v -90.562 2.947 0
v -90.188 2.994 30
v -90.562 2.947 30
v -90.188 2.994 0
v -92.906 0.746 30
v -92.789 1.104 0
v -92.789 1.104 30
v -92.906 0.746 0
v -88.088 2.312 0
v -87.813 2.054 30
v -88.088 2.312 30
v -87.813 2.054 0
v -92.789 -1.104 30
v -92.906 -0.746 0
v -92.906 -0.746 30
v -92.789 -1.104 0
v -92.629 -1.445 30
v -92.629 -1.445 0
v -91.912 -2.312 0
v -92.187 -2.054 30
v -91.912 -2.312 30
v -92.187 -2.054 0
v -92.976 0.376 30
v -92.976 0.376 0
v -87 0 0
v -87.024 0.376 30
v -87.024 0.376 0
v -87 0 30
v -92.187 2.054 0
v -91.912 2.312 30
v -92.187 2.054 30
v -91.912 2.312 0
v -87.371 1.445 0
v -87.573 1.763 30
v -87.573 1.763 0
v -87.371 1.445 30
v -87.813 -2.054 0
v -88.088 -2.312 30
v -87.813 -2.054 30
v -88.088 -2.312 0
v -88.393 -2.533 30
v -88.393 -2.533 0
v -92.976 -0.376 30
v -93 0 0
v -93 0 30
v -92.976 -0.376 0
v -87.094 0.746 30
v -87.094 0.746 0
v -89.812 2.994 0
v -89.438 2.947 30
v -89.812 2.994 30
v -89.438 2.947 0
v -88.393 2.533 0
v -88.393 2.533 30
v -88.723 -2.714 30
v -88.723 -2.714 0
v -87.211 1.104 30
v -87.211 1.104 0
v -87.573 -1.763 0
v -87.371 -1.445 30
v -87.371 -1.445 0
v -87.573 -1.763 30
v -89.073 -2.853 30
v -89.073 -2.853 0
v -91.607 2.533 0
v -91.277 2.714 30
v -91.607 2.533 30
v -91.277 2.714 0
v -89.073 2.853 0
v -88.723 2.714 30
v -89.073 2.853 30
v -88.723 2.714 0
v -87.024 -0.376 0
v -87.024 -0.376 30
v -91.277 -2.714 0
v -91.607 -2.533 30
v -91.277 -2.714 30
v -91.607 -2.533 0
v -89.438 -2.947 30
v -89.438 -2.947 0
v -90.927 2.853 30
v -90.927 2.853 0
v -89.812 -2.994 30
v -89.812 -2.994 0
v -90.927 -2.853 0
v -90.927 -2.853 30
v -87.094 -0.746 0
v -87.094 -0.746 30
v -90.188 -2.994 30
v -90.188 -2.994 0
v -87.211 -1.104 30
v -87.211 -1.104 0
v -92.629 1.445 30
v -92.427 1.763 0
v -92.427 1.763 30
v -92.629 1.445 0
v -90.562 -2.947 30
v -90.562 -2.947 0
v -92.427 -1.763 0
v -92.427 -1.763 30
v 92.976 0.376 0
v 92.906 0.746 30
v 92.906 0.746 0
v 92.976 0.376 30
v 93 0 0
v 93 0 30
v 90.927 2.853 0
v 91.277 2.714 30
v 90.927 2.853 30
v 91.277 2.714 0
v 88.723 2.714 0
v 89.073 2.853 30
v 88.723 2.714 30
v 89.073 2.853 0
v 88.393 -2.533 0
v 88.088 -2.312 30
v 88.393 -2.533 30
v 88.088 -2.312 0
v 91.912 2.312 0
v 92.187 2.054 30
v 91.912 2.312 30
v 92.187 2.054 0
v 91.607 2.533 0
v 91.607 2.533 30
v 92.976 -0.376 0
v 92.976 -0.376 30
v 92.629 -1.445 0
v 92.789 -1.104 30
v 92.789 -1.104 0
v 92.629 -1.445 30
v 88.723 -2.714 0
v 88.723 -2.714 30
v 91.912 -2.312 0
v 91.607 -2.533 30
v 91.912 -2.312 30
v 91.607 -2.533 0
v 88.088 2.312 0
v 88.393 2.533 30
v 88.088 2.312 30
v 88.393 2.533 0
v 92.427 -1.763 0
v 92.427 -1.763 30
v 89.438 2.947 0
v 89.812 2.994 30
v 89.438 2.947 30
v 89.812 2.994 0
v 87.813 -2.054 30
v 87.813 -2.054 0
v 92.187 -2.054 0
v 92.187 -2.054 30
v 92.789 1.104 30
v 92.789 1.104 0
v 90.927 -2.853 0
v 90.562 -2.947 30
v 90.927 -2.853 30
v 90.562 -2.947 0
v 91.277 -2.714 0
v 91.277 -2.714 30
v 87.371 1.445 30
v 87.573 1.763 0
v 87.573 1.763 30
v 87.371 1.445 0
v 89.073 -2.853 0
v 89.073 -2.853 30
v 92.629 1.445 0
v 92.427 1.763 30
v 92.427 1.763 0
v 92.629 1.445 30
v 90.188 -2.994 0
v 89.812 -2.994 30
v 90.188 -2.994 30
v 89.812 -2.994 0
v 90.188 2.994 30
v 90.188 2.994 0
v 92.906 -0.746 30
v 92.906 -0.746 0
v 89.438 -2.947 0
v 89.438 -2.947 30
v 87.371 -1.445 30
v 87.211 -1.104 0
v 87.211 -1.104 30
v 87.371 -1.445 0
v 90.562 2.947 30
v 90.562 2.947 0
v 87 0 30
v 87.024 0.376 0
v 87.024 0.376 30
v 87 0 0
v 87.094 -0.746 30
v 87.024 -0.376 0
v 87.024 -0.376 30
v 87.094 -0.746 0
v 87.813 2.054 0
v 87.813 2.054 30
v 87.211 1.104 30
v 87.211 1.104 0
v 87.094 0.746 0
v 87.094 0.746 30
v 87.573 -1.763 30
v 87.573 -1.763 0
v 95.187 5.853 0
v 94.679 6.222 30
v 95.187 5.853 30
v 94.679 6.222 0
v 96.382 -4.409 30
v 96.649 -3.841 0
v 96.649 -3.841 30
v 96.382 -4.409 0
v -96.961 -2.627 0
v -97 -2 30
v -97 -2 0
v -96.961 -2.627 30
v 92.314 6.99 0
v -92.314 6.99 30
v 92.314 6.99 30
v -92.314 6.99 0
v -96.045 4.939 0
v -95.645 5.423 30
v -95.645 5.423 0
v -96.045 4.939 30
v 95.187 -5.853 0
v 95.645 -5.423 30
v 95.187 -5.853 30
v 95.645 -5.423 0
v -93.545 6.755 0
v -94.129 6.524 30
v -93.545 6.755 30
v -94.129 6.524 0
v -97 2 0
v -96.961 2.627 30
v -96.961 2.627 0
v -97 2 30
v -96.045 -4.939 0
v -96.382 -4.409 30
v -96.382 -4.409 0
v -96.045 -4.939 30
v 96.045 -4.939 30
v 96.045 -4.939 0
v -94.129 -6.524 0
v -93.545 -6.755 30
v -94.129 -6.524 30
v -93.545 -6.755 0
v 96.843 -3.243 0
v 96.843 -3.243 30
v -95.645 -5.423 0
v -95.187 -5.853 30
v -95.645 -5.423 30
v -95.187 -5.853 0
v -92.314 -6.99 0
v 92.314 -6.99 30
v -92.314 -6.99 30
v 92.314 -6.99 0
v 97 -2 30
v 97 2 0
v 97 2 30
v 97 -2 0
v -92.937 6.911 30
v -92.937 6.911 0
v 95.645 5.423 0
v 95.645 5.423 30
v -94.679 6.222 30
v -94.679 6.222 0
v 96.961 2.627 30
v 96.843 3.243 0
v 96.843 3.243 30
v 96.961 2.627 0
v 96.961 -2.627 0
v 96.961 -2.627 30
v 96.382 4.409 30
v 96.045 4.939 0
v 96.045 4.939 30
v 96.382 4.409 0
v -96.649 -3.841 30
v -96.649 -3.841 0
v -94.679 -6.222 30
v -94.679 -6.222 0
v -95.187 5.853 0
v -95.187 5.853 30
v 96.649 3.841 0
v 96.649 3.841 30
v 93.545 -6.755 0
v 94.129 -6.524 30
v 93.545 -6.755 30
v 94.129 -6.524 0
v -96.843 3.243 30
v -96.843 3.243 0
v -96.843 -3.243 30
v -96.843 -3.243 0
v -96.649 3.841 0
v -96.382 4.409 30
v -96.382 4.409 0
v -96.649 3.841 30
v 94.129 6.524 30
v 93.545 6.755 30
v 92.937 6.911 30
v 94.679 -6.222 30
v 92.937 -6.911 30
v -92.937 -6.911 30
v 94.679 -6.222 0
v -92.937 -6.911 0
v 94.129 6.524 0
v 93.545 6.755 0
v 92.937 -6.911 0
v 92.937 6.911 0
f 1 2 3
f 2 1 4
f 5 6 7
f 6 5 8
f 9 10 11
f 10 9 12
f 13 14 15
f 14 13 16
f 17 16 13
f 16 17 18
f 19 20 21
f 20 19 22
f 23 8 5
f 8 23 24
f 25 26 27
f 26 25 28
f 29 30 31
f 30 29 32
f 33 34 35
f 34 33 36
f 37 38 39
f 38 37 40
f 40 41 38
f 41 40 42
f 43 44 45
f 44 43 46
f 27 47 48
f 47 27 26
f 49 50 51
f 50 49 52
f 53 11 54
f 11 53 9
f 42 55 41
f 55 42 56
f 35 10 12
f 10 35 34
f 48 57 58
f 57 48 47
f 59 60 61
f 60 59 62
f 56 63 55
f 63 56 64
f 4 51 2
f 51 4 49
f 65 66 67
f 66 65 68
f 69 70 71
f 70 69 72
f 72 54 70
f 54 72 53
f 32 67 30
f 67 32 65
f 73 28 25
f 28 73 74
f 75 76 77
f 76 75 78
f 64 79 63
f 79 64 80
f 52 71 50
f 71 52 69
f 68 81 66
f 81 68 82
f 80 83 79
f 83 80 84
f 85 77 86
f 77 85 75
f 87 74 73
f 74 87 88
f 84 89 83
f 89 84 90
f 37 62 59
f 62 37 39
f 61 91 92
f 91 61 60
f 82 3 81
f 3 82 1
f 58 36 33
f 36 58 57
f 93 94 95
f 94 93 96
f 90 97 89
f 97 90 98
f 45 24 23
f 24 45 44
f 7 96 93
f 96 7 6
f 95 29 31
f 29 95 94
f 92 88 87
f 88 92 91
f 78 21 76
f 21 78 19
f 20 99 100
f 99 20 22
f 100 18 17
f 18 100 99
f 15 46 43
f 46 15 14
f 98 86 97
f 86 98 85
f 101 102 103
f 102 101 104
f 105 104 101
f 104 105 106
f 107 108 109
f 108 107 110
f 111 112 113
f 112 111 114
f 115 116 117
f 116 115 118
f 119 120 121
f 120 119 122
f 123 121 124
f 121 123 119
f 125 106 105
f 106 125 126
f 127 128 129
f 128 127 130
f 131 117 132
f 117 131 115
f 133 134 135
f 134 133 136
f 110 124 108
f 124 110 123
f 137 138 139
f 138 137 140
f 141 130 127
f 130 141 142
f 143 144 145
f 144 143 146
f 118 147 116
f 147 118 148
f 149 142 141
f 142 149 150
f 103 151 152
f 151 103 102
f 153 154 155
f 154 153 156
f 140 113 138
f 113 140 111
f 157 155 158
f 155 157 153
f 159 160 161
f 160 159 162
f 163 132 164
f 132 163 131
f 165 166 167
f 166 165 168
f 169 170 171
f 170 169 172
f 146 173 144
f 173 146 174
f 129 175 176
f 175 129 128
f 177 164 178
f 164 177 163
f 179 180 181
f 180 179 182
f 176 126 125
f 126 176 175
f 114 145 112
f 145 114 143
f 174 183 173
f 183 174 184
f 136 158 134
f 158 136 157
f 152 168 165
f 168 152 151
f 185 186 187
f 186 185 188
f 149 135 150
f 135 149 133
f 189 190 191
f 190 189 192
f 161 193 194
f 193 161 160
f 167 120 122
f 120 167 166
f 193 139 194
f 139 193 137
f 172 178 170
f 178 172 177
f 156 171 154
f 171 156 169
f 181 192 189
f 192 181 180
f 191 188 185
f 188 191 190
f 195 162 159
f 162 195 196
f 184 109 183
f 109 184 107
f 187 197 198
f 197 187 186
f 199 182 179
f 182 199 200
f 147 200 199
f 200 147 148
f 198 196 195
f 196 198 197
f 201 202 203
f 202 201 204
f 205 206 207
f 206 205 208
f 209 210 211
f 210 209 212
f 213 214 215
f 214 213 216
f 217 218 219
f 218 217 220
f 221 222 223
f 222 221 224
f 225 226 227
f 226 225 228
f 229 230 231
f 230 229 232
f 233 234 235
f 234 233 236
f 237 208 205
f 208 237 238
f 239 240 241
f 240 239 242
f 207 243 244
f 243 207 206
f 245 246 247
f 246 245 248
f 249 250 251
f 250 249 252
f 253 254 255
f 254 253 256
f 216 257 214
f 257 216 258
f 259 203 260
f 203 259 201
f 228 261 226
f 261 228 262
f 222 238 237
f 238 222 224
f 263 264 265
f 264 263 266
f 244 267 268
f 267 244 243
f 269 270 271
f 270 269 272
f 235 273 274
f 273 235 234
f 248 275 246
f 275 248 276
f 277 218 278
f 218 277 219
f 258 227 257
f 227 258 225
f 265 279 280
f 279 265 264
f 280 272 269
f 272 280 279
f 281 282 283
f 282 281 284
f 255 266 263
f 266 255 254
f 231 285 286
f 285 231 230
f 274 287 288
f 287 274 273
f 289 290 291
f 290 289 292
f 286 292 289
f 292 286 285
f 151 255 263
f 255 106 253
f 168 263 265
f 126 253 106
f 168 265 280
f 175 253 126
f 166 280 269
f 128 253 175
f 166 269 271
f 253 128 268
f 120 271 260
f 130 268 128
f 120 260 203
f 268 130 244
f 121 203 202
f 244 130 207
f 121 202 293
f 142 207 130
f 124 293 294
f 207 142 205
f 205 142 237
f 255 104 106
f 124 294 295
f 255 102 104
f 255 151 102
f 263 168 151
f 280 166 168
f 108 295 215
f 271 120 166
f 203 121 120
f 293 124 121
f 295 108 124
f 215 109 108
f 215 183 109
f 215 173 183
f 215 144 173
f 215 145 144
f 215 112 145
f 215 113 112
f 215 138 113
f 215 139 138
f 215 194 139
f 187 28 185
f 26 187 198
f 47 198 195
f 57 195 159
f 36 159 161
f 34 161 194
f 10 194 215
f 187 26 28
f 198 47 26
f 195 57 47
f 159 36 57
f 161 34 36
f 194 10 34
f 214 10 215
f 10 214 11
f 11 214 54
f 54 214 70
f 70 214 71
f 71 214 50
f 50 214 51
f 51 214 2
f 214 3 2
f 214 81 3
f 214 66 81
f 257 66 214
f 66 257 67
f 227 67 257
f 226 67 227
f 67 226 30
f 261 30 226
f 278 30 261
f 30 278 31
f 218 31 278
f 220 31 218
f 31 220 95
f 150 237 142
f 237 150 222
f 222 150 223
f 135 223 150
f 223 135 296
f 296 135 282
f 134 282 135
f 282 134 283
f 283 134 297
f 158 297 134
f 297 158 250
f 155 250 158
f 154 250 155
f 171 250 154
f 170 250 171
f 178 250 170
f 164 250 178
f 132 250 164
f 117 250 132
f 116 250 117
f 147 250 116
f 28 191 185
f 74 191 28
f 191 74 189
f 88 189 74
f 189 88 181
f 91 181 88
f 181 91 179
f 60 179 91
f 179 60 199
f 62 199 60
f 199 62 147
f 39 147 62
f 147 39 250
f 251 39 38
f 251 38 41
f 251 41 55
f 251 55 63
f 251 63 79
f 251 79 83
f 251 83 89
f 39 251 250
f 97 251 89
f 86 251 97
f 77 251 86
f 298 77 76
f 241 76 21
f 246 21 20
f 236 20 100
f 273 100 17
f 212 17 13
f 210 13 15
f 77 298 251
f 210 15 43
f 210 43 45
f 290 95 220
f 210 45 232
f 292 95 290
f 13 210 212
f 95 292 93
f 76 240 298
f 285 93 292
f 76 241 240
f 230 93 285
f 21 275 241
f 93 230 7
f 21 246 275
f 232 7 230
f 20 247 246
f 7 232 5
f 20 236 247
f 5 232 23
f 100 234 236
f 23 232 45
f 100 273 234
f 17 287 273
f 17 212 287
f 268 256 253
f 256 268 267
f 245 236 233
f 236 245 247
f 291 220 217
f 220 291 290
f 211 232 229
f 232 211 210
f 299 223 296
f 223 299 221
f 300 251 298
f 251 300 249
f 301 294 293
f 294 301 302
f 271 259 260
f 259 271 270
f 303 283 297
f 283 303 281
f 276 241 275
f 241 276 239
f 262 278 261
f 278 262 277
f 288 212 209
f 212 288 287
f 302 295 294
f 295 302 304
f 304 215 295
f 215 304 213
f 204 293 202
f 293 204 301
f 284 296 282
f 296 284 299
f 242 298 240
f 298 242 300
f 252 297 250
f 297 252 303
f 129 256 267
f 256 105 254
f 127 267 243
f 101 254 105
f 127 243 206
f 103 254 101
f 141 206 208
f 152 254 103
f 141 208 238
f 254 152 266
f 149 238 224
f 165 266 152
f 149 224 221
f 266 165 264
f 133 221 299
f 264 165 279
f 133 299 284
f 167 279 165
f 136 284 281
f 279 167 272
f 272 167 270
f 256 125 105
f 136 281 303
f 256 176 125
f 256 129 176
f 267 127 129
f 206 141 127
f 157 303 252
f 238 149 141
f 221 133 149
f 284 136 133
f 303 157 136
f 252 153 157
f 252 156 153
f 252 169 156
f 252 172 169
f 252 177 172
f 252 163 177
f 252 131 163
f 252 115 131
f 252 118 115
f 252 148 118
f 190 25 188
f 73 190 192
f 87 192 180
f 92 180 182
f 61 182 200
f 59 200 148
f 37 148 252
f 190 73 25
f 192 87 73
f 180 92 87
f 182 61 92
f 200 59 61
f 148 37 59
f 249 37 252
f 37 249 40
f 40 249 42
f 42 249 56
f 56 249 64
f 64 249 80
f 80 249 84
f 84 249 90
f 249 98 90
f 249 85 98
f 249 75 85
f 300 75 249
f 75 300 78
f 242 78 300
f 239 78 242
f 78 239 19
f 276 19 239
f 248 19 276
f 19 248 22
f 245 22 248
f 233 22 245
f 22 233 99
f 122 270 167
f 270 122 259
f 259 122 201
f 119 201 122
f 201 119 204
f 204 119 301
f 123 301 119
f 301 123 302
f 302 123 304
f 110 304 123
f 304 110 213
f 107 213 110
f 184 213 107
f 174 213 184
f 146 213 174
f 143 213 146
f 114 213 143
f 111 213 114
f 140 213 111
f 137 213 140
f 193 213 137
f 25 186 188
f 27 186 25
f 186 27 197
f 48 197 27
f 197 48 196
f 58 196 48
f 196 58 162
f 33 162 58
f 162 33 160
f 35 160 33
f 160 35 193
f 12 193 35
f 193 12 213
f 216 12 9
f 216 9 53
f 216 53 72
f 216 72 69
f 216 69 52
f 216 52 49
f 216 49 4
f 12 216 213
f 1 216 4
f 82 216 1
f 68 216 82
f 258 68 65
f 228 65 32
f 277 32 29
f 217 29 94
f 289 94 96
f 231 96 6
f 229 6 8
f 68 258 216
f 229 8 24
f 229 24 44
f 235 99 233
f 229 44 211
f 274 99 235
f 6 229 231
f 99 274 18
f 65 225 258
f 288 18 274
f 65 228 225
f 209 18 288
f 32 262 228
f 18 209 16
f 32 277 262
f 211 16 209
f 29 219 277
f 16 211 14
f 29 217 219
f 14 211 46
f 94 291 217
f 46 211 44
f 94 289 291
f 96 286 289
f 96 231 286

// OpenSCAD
$fn = 50;


difference() {
	union() {
		hull() {
			translate(v = [-92.0000000000, 2.0000000000, 0]) {
				cylinder(h = 30, r = 5);
			}
			translate(v = [92.0000000000, 2.0000000000, 0]) {
				cylinder(h = 30, r = 5);
			}
			translate(v = [-92.0000000000, -2.0000000000, 0]) {
				cylinder(h = 30, r = 5);
			}
			translate(v = [92.0000000000, -2.0000000000, 0]) {
				cylinder(h = 30, r = 5);
			}
		}
	}
	union() {
		translate(v = [-90.0000000000, 0.0000000000, -100.0000000000]) {
			cylinder(h = 200, r = 3.0000000000);
		}
		translate(v = [-90.0000000000, 0.0000000000, -100.0000000000]) {
			cylinder(h = 200, r = 3.0000000000);
		}
		translate(v = [90.0000000000, 0.0000000000, -100.0000000000]) {
			cylinder(h = 200, r = 3.0000000000);
		}
		translate(v = [90.0000000000, 0.0000000000, -100.0000000000]) {
			cylinder(h = 200, r = 3.0000000000);
		}
	}
}
